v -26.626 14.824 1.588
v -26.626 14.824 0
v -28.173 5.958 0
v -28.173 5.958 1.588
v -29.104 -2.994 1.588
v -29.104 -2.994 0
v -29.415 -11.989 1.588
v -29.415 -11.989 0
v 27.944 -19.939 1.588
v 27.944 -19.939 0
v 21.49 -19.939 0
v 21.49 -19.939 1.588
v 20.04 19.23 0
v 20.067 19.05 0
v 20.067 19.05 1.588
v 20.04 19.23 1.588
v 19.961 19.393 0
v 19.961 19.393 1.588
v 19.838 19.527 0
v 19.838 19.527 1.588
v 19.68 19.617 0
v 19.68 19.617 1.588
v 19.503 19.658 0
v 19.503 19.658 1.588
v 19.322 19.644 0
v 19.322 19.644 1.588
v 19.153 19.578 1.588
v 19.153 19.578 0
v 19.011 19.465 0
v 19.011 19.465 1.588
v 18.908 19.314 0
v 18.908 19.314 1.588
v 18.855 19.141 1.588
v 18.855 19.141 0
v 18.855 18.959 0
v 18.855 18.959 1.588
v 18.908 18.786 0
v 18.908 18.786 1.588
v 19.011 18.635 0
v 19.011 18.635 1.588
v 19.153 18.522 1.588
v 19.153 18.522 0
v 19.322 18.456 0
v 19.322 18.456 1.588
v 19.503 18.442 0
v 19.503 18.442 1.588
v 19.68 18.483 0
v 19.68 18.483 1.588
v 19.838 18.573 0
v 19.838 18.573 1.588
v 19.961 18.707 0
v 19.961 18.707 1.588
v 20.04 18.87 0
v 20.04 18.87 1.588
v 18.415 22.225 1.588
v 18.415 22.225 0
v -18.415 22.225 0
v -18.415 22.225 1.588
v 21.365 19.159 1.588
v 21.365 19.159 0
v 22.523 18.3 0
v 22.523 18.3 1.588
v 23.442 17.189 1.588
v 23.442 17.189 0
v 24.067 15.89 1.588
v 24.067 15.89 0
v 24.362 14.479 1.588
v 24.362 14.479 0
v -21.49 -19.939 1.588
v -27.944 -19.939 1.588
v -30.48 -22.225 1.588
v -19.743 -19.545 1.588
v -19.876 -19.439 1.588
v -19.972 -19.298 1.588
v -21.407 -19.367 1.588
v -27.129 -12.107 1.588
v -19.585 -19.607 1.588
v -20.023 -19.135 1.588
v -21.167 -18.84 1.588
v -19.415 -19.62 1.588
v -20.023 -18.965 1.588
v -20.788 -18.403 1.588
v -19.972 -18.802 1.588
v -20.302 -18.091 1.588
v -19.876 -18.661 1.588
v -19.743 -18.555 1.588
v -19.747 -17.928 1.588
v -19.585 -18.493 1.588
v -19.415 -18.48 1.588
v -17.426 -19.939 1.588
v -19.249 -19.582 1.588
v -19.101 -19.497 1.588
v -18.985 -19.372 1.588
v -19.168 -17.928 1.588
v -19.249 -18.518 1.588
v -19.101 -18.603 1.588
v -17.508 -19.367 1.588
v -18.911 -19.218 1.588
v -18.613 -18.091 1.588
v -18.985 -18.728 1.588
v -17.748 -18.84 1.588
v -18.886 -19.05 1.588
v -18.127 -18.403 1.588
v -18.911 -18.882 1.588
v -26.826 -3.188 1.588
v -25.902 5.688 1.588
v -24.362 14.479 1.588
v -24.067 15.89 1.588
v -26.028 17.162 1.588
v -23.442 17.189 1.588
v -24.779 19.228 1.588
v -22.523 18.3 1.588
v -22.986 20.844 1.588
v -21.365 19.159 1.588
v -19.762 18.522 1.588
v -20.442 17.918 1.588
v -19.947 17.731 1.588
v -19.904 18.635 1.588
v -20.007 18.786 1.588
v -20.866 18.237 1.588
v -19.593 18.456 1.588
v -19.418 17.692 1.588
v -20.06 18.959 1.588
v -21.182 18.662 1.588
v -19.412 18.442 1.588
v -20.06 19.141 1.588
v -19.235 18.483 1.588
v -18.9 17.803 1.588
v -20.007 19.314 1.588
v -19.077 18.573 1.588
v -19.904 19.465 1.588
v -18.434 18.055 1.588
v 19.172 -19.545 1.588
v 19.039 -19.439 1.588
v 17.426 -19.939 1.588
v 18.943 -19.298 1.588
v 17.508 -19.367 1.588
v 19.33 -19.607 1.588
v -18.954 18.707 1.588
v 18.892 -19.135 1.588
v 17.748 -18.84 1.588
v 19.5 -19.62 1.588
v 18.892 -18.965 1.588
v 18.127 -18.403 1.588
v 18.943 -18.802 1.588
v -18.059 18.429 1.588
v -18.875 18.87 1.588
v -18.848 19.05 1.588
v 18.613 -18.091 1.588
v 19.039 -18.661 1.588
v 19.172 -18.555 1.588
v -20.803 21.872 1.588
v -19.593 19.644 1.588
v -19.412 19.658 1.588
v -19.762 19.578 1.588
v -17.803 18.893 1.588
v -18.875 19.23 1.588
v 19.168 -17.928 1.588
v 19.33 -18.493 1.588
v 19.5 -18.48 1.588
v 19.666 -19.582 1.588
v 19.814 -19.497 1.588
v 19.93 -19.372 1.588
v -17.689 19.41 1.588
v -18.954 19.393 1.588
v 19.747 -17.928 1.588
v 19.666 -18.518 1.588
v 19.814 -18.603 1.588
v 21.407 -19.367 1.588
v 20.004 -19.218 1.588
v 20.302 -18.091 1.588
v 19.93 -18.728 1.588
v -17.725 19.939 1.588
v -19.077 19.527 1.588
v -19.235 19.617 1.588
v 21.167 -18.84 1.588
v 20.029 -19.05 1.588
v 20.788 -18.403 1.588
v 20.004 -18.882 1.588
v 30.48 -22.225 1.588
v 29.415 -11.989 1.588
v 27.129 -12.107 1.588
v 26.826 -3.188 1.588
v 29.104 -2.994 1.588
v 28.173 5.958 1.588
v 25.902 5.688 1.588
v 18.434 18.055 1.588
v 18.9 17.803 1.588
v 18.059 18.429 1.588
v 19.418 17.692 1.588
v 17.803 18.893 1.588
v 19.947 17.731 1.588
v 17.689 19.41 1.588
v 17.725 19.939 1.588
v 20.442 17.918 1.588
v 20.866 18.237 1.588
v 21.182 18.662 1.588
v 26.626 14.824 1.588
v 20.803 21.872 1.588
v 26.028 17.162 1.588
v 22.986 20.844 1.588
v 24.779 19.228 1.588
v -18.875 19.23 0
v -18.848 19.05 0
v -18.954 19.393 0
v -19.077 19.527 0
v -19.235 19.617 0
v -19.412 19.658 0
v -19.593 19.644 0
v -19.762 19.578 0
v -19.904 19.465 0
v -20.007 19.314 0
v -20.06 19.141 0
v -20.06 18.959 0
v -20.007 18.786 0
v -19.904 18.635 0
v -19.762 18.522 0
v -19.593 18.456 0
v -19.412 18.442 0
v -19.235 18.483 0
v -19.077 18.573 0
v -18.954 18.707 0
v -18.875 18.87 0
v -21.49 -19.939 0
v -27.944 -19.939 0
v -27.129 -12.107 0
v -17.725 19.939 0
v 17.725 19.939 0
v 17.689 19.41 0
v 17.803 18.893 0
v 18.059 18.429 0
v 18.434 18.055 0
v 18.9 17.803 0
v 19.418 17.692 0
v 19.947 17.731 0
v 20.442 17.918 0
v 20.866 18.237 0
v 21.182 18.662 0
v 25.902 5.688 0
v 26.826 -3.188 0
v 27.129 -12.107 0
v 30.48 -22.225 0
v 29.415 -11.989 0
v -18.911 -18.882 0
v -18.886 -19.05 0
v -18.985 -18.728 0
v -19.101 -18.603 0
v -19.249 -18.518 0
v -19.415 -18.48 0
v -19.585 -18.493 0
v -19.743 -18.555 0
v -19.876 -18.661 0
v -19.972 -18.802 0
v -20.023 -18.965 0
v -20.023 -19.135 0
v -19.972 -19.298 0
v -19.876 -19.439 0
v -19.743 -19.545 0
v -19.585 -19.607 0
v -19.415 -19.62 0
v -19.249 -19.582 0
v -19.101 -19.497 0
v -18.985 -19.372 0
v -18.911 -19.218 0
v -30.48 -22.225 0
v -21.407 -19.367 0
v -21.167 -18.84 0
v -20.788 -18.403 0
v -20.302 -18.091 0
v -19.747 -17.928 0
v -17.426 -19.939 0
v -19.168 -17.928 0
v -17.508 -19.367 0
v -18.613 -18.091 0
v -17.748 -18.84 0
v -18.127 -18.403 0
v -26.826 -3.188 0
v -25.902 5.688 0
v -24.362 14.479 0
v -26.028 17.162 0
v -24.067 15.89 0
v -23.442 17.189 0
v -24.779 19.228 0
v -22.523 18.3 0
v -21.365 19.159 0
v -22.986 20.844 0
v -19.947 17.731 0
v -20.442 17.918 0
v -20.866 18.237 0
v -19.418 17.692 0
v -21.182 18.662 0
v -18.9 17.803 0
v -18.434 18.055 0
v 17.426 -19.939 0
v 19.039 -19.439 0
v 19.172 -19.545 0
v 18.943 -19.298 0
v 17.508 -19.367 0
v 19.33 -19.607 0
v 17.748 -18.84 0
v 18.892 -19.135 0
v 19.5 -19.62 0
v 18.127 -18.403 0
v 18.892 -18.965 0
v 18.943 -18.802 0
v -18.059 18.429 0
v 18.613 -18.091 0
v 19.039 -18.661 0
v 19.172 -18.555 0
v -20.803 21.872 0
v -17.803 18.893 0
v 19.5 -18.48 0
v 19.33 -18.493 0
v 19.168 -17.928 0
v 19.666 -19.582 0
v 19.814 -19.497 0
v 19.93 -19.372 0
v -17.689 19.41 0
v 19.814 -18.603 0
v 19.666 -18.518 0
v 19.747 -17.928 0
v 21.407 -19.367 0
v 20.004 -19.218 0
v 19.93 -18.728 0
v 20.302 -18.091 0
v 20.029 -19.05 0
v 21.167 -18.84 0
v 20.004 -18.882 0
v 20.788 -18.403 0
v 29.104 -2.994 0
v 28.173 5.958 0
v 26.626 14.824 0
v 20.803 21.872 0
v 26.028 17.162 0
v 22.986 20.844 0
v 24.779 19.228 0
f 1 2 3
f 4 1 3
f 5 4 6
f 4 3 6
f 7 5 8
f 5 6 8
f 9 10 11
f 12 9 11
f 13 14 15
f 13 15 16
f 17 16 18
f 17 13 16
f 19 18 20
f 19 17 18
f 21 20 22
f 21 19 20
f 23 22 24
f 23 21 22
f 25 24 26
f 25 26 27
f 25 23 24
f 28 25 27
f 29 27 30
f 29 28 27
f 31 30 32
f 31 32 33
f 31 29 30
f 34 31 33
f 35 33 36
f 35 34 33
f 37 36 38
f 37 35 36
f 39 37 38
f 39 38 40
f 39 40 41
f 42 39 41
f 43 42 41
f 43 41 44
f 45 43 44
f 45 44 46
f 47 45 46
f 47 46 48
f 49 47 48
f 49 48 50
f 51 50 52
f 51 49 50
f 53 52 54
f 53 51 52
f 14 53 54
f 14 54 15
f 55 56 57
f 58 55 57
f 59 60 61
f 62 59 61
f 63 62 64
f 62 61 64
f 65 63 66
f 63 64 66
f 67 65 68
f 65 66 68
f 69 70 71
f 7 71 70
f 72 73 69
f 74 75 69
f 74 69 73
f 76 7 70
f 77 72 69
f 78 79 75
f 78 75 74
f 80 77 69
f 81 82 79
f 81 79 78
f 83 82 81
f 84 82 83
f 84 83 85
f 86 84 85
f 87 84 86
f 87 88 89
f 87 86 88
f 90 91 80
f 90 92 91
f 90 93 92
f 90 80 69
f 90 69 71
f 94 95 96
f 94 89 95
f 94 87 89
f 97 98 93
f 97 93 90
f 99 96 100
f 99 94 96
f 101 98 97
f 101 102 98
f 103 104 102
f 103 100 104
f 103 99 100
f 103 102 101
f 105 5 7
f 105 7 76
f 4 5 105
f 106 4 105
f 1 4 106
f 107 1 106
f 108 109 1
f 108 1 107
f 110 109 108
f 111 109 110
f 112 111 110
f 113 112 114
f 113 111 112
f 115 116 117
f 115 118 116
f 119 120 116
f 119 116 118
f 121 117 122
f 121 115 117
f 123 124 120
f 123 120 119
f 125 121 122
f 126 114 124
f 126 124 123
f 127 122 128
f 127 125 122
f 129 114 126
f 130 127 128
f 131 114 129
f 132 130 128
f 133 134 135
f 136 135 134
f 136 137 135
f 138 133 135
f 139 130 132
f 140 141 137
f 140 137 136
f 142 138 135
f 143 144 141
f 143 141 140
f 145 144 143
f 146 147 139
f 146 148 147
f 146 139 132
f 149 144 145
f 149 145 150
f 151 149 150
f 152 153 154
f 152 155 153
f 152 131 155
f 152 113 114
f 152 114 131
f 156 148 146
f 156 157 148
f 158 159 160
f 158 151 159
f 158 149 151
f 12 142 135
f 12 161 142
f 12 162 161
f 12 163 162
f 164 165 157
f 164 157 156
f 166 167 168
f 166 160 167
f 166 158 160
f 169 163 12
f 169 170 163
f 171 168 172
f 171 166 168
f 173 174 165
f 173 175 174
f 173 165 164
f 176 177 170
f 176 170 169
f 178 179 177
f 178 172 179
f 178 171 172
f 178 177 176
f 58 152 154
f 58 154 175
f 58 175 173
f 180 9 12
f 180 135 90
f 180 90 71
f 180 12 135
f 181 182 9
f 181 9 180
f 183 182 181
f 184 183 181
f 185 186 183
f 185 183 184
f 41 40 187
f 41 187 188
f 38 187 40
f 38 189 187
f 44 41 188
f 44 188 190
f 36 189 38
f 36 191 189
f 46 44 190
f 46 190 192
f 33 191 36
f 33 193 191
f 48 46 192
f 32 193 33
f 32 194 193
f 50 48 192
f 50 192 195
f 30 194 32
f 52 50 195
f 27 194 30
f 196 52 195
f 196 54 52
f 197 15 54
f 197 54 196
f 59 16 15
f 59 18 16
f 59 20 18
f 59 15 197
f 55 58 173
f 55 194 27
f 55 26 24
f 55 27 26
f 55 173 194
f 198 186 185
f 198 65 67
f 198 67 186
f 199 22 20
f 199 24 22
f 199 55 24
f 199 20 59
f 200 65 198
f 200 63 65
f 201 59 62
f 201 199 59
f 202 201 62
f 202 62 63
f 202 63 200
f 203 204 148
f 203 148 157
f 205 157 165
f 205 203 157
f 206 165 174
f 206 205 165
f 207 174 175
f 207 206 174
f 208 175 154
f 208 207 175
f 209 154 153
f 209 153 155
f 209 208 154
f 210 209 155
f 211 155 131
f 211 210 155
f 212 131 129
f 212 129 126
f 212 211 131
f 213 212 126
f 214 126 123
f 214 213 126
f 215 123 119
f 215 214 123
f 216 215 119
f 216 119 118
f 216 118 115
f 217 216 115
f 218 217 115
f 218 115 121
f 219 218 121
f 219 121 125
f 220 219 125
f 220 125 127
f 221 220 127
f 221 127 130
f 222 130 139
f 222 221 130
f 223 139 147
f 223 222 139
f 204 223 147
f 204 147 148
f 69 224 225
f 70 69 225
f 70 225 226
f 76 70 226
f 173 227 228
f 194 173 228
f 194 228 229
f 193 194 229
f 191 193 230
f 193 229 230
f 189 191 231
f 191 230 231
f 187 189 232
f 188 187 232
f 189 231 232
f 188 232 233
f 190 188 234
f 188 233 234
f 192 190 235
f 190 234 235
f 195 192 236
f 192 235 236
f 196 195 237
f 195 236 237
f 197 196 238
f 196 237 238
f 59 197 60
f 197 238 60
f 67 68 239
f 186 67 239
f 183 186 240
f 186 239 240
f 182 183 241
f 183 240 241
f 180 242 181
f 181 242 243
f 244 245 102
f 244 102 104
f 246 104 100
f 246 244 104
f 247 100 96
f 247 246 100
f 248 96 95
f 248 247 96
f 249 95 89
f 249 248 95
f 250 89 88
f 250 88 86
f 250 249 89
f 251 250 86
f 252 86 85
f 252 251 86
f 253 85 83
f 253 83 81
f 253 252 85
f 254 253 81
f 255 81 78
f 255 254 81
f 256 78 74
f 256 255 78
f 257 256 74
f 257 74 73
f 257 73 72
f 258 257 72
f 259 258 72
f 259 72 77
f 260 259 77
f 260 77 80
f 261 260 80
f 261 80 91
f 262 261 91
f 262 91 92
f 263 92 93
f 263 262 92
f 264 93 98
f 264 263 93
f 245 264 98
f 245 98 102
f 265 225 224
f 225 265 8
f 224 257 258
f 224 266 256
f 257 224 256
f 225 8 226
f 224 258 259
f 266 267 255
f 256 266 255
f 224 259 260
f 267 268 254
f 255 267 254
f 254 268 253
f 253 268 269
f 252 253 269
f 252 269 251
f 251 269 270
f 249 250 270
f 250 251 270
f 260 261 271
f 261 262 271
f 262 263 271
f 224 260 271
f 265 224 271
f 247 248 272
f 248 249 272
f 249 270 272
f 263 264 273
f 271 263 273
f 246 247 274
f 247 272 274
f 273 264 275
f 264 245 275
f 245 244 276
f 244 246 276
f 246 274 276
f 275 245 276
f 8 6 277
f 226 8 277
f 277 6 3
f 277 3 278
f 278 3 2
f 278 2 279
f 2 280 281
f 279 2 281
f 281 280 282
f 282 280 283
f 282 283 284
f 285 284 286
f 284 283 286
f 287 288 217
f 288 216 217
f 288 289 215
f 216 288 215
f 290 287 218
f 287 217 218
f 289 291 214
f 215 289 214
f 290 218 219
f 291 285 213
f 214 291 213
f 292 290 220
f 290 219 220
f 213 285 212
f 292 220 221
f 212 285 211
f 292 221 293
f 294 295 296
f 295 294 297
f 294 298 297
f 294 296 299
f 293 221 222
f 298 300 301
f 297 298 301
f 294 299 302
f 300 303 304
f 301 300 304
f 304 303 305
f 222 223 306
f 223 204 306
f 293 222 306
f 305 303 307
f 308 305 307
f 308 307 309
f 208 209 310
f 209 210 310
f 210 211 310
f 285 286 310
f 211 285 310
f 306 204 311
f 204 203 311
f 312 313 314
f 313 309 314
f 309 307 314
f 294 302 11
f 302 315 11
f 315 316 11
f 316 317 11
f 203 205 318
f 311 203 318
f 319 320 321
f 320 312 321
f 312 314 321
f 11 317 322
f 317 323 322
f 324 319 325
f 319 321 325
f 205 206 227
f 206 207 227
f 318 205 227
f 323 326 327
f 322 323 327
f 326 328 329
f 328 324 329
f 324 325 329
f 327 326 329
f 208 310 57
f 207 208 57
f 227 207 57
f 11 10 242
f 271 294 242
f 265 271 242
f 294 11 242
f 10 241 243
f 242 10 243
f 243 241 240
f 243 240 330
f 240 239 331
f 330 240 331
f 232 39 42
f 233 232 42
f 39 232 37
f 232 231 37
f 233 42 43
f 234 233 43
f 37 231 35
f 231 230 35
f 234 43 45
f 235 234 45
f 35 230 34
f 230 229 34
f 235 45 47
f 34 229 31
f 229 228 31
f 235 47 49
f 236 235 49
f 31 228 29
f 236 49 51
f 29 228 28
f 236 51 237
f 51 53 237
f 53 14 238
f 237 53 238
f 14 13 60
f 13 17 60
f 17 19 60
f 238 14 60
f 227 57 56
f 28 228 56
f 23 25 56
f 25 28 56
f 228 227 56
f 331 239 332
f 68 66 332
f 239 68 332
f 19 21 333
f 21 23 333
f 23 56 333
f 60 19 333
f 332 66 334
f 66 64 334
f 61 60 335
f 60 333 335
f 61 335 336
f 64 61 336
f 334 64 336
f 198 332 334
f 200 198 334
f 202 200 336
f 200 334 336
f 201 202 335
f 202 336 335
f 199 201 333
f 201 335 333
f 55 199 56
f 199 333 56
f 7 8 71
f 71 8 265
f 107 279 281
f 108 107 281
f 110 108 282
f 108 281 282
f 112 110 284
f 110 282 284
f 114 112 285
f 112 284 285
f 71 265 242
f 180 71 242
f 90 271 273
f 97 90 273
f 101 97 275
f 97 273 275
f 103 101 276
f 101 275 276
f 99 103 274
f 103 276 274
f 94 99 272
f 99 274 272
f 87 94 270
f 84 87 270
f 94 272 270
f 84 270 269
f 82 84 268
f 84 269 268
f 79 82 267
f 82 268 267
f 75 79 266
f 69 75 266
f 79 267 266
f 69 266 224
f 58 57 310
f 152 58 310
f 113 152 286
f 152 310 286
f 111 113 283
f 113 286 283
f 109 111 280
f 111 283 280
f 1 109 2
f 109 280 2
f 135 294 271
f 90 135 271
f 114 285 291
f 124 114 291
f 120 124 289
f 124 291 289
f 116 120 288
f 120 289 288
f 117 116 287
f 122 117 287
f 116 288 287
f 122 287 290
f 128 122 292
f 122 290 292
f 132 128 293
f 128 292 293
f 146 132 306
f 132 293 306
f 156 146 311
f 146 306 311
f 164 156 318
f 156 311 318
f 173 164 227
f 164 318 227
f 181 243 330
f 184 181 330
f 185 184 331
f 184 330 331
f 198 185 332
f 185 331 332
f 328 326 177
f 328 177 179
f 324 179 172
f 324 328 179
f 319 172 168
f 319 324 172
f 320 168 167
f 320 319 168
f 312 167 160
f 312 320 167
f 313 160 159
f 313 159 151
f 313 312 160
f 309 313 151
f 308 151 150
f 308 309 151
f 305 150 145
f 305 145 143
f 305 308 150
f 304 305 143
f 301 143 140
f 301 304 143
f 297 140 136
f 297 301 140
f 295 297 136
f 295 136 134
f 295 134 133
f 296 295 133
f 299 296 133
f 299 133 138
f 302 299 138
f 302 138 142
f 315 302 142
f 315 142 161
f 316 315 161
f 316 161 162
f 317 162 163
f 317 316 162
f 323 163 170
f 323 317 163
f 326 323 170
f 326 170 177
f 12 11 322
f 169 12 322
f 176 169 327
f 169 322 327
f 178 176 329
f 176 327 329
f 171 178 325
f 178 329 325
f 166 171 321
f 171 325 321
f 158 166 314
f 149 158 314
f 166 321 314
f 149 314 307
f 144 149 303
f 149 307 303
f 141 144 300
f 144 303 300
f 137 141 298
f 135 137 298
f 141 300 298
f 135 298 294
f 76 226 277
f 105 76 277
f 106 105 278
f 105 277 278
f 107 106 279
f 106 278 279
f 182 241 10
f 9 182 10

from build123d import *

# Parameters (mm, degrees)
SKETCH1_R           = 0.6096
SKETCH1_R_2         = 0.5715
BOSS_EXTRUDE1_DEPTH = 1.5875


with BuildPart() as part:
    # Sketch1 → Boss-Extrude1 (new body)
    with BuildSketch(Plane.XY):
        with BuildLine():
            Line((30.48, -22.225), (29.415104476, -11.9888))
            ThreePointArc((29.415104476, -11.9888), (28.715873825, 1.490040556), (26.625688573, 14.824176893))
            ThreePointArc((26.625688573, 14.824176893), (23.941924767, 20.101731209), (18.415, 22.225))
            Line((18.415, 22.225), (-18.415, 22.225))
            ThreePointArc((-18.415, 22.225), (-23.941924767, 20.101731209), (-26.625688573, 14.824176893))
            ThreePointArc((-26.625688573, 14.824176893), (-28.715873825, 1.490040556), (-29.415104476, -11.9888))
            Line((-29.415104476, -11.9888), (-30.48, -22.225))
            Line((-30.48, -22.225), (30.48, -22.225))
        make_face()
        with BuildLine():
            ThreePointArc((17.725268352, 19.939), (19.155271645, 17.728799653), (21.365471992, 19.158802947))
            ThreePointArc((21.365471992, 19.158802947), (23.441797038, 17.188737724), (24.362294321, 14.478577686))
            ThreePointArc((24.362294321, 14.478577686), (26.441646573, 1.258286409), (27.129050016, -12.106865432))
            Line((27.129050016, -12.106865432), (27.943845061, -19.939))
            Line((27.943845061, -19.939), (21.489528855, -19.939))
            ThreePointArc((21.489528855, -19.939), (19.457528855, -17.907), (17.425528855, -19.939))
            Line((17.425528855, -19.939), (-17.425528855, -19.939))
            ThreePointArc((-17.425528855, -19.939), (-19.457528855, -17.907), (-21.489528855, -19.939))
            Line((-21.489528855, -19.939), (-27.943845061, -19.939))
            Line((-27.943845061, -19.939), (-27.129050016, -12.106865432))
            ThreePointArc((-27.129050016, -12.106865432), (-26.441646573, 1.258286409), (-24.362294321, 14.478577686))
            ThreePointArc((-24.362294321, 14.478577686), (-23.441797038, 17.188737724), (-21.365471992, 19.158802947))
            ThreePointArc((-21.365471992, 19.158802947), (-19.155271645, 17.728799653), (-17.725268352, 19.939))
            Line((-17.725268352, 19.939), (17.725268352, 19.939))
        make_face(mode=Mode.SUBTRACT)
        with Locations((19.457528855, 19.05)):
            Circle(SKETCH1_R, mode=Mode.SUBTRACT)
        with Locations((-19.457528855, 19.05)):
            Circle(SKETCH1_R, mode=Mode.SUBTRACT)
        with Locations((19.457528855, -19.05)):
            Circle(SKETCH1_R_2, mode=Mode.SUBTRACT)
        with Locations((-19.457528855, -19.05)):
            Circle(SKETCH1_R_2, mode=Mode.SUBTRACT)
    extrude(amount=BOSS_EXTRUDE1_DEPTH)


solid = part.part
